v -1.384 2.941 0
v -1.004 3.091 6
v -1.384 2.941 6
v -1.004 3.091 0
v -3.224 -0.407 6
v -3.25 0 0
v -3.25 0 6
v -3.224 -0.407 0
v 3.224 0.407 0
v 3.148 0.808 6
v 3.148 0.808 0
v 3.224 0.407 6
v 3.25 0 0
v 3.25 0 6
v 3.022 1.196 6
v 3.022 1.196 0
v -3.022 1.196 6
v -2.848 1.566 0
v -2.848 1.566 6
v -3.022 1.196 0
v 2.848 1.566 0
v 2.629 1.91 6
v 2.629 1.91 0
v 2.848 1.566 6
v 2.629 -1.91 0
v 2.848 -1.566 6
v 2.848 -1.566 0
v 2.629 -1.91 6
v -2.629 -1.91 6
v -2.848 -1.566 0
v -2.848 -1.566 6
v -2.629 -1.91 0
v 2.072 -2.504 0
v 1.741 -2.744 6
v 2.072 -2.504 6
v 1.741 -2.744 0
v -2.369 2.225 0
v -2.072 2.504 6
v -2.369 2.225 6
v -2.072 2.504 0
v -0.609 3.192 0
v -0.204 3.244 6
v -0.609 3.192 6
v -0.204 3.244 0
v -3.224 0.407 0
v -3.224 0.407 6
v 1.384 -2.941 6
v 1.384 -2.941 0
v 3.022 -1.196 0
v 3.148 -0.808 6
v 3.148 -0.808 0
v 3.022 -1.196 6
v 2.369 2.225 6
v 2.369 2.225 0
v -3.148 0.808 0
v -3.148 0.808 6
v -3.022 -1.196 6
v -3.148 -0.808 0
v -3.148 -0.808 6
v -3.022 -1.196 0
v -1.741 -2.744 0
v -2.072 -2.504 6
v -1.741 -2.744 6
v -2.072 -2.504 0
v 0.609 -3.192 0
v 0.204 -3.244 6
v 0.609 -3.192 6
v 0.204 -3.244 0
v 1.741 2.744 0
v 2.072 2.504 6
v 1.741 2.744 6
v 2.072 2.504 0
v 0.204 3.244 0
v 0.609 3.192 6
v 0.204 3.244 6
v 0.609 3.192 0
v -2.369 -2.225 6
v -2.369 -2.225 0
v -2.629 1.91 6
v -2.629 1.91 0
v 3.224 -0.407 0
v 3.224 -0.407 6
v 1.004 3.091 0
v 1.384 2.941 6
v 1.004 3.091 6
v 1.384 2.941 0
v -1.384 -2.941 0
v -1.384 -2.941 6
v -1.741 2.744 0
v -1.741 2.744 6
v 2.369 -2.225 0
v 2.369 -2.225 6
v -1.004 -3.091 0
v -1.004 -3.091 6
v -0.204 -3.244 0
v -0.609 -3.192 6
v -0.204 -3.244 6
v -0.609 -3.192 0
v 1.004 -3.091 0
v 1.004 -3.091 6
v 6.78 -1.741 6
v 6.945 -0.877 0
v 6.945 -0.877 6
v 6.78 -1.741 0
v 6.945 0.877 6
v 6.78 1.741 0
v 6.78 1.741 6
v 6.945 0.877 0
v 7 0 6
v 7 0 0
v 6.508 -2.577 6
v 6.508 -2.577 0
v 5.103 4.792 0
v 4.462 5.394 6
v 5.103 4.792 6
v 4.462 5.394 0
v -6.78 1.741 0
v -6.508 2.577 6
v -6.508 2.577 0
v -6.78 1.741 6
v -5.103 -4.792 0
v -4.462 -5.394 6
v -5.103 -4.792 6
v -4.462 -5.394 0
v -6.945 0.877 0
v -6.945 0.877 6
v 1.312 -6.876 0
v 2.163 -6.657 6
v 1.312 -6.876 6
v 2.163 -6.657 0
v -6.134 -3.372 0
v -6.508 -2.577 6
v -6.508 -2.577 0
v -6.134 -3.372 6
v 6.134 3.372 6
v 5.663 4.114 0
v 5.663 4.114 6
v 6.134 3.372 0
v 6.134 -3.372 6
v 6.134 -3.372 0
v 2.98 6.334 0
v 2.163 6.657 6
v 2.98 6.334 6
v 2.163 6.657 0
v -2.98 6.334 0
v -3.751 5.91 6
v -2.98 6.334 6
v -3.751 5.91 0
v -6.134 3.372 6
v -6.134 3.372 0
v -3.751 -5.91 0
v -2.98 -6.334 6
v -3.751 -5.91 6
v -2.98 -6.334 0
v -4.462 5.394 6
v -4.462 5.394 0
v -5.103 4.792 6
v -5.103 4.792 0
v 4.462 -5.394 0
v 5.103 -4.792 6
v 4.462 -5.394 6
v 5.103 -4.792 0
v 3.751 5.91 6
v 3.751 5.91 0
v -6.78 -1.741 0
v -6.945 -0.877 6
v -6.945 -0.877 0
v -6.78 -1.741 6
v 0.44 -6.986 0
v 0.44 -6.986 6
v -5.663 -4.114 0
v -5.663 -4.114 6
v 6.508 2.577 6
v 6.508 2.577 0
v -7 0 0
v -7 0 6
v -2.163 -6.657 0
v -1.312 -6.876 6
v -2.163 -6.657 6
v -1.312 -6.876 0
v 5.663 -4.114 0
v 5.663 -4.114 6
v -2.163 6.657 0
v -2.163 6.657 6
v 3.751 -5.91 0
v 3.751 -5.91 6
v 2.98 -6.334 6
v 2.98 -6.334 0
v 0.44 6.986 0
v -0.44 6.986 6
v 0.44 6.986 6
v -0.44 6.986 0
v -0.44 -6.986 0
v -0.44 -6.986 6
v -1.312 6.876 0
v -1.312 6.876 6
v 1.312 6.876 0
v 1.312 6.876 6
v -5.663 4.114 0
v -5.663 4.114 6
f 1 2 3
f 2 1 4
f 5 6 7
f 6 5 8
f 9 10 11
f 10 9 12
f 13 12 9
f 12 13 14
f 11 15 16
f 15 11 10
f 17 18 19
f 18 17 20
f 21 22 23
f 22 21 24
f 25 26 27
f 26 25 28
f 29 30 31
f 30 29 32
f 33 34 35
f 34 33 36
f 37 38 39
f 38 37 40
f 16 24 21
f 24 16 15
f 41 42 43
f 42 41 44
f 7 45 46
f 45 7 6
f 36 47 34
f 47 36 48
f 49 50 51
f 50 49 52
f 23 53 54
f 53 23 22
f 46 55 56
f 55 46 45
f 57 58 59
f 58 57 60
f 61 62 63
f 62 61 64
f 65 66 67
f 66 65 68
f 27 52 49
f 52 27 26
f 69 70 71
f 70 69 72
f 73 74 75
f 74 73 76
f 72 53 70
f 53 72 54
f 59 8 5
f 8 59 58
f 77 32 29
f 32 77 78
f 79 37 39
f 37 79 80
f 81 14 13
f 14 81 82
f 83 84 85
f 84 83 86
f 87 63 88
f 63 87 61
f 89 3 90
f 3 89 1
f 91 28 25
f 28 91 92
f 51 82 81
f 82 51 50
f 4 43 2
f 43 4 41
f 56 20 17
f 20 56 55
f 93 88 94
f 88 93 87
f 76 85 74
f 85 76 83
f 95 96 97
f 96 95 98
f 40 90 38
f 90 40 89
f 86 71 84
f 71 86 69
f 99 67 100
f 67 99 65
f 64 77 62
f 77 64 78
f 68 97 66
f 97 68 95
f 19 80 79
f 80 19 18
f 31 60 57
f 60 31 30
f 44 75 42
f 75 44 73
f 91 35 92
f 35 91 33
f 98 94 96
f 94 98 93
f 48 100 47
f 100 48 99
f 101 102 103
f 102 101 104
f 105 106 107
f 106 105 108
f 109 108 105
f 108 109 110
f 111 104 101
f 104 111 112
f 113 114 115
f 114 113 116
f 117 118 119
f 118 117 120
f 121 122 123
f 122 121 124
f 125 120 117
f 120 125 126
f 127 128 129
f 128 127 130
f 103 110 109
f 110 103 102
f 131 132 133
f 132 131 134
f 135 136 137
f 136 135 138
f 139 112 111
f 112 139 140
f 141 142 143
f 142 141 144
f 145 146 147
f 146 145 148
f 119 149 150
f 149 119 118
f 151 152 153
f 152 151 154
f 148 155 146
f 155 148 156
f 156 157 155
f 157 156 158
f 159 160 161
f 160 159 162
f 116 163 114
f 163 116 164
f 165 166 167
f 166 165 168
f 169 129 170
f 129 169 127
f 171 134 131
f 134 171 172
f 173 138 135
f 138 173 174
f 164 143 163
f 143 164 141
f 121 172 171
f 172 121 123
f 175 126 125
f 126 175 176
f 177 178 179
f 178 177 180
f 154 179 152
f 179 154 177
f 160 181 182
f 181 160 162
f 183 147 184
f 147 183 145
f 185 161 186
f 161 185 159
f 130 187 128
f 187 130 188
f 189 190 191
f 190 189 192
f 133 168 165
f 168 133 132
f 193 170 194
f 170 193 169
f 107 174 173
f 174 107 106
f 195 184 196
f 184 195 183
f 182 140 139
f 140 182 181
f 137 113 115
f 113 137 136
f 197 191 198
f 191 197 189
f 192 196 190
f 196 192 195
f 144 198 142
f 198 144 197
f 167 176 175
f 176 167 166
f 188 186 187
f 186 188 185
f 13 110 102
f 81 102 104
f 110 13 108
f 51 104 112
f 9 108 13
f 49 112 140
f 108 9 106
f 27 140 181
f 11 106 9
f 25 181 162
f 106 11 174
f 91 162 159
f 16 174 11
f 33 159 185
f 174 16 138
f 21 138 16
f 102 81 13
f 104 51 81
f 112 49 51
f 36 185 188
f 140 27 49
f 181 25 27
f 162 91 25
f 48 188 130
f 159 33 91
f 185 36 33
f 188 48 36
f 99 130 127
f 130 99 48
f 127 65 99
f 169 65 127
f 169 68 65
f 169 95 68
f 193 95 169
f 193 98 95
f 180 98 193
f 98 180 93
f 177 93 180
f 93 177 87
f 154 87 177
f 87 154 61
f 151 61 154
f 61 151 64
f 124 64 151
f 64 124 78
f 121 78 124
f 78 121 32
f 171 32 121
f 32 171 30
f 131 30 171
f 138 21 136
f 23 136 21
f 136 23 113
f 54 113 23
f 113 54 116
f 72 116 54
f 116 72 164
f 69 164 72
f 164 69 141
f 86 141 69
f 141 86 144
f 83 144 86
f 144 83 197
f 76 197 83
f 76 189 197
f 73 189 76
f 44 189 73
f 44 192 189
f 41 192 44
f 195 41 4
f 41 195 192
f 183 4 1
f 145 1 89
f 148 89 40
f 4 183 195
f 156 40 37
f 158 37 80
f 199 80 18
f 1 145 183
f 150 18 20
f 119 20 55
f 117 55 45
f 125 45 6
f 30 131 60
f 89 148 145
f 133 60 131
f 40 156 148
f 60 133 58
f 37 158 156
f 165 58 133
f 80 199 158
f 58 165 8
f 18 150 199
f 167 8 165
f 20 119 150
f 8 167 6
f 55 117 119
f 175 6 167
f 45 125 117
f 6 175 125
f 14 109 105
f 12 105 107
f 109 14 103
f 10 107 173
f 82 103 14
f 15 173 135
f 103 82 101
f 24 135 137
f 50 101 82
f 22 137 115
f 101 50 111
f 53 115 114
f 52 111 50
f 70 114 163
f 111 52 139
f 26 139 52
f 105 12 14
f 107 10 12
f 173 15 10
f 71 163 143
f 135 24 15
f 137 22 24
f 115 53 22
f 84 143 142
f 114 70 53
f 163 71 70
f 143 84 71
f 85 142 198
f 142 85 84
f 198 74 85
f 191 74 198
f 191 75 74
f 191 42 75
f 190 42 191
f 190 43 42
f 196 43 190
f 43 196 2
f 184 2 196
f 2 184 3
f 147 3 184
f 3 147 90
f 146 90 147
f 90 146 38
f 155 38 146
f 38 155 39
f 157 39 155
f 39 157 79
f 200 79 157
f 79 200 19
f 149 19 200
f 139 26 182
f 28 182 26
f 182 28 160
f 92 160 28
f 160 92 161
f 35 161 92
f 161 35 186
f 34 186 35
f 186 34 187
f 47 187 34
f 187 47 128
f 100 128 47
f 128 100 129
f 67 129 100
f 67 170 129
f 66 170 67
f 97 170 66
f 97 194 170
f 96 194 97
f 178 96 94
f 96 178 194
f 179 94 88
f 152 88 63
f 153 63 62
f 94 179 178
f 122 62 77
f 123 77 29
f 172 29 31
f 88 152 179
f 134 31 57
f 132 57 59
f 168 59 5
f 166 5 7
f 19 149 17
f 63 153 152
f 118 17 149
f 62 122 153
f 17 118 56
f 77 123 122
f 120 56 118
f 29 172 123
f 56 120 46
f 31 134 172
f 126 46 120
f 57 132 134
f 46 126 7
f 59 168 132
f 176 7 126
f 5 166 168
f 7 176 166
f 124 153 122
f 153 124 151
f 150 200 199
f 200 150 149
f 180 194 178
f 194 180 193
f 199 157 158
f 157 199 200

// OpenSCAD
$fn = 50;

difference() {
	union() {
		cylinder(h = 6, r = 7.0);
	}
	union() {
		translate(v = [0.0, 0.0, -100.0]) {
			cylinder(h = 200, r = 3.25);
		}
		translate(v = [0.0, 0.0, -100.0]) {
			cylinder(h = 200, r = 1.8);
		}
		cylinder(h = 6, r = 2.0);
	}
}
